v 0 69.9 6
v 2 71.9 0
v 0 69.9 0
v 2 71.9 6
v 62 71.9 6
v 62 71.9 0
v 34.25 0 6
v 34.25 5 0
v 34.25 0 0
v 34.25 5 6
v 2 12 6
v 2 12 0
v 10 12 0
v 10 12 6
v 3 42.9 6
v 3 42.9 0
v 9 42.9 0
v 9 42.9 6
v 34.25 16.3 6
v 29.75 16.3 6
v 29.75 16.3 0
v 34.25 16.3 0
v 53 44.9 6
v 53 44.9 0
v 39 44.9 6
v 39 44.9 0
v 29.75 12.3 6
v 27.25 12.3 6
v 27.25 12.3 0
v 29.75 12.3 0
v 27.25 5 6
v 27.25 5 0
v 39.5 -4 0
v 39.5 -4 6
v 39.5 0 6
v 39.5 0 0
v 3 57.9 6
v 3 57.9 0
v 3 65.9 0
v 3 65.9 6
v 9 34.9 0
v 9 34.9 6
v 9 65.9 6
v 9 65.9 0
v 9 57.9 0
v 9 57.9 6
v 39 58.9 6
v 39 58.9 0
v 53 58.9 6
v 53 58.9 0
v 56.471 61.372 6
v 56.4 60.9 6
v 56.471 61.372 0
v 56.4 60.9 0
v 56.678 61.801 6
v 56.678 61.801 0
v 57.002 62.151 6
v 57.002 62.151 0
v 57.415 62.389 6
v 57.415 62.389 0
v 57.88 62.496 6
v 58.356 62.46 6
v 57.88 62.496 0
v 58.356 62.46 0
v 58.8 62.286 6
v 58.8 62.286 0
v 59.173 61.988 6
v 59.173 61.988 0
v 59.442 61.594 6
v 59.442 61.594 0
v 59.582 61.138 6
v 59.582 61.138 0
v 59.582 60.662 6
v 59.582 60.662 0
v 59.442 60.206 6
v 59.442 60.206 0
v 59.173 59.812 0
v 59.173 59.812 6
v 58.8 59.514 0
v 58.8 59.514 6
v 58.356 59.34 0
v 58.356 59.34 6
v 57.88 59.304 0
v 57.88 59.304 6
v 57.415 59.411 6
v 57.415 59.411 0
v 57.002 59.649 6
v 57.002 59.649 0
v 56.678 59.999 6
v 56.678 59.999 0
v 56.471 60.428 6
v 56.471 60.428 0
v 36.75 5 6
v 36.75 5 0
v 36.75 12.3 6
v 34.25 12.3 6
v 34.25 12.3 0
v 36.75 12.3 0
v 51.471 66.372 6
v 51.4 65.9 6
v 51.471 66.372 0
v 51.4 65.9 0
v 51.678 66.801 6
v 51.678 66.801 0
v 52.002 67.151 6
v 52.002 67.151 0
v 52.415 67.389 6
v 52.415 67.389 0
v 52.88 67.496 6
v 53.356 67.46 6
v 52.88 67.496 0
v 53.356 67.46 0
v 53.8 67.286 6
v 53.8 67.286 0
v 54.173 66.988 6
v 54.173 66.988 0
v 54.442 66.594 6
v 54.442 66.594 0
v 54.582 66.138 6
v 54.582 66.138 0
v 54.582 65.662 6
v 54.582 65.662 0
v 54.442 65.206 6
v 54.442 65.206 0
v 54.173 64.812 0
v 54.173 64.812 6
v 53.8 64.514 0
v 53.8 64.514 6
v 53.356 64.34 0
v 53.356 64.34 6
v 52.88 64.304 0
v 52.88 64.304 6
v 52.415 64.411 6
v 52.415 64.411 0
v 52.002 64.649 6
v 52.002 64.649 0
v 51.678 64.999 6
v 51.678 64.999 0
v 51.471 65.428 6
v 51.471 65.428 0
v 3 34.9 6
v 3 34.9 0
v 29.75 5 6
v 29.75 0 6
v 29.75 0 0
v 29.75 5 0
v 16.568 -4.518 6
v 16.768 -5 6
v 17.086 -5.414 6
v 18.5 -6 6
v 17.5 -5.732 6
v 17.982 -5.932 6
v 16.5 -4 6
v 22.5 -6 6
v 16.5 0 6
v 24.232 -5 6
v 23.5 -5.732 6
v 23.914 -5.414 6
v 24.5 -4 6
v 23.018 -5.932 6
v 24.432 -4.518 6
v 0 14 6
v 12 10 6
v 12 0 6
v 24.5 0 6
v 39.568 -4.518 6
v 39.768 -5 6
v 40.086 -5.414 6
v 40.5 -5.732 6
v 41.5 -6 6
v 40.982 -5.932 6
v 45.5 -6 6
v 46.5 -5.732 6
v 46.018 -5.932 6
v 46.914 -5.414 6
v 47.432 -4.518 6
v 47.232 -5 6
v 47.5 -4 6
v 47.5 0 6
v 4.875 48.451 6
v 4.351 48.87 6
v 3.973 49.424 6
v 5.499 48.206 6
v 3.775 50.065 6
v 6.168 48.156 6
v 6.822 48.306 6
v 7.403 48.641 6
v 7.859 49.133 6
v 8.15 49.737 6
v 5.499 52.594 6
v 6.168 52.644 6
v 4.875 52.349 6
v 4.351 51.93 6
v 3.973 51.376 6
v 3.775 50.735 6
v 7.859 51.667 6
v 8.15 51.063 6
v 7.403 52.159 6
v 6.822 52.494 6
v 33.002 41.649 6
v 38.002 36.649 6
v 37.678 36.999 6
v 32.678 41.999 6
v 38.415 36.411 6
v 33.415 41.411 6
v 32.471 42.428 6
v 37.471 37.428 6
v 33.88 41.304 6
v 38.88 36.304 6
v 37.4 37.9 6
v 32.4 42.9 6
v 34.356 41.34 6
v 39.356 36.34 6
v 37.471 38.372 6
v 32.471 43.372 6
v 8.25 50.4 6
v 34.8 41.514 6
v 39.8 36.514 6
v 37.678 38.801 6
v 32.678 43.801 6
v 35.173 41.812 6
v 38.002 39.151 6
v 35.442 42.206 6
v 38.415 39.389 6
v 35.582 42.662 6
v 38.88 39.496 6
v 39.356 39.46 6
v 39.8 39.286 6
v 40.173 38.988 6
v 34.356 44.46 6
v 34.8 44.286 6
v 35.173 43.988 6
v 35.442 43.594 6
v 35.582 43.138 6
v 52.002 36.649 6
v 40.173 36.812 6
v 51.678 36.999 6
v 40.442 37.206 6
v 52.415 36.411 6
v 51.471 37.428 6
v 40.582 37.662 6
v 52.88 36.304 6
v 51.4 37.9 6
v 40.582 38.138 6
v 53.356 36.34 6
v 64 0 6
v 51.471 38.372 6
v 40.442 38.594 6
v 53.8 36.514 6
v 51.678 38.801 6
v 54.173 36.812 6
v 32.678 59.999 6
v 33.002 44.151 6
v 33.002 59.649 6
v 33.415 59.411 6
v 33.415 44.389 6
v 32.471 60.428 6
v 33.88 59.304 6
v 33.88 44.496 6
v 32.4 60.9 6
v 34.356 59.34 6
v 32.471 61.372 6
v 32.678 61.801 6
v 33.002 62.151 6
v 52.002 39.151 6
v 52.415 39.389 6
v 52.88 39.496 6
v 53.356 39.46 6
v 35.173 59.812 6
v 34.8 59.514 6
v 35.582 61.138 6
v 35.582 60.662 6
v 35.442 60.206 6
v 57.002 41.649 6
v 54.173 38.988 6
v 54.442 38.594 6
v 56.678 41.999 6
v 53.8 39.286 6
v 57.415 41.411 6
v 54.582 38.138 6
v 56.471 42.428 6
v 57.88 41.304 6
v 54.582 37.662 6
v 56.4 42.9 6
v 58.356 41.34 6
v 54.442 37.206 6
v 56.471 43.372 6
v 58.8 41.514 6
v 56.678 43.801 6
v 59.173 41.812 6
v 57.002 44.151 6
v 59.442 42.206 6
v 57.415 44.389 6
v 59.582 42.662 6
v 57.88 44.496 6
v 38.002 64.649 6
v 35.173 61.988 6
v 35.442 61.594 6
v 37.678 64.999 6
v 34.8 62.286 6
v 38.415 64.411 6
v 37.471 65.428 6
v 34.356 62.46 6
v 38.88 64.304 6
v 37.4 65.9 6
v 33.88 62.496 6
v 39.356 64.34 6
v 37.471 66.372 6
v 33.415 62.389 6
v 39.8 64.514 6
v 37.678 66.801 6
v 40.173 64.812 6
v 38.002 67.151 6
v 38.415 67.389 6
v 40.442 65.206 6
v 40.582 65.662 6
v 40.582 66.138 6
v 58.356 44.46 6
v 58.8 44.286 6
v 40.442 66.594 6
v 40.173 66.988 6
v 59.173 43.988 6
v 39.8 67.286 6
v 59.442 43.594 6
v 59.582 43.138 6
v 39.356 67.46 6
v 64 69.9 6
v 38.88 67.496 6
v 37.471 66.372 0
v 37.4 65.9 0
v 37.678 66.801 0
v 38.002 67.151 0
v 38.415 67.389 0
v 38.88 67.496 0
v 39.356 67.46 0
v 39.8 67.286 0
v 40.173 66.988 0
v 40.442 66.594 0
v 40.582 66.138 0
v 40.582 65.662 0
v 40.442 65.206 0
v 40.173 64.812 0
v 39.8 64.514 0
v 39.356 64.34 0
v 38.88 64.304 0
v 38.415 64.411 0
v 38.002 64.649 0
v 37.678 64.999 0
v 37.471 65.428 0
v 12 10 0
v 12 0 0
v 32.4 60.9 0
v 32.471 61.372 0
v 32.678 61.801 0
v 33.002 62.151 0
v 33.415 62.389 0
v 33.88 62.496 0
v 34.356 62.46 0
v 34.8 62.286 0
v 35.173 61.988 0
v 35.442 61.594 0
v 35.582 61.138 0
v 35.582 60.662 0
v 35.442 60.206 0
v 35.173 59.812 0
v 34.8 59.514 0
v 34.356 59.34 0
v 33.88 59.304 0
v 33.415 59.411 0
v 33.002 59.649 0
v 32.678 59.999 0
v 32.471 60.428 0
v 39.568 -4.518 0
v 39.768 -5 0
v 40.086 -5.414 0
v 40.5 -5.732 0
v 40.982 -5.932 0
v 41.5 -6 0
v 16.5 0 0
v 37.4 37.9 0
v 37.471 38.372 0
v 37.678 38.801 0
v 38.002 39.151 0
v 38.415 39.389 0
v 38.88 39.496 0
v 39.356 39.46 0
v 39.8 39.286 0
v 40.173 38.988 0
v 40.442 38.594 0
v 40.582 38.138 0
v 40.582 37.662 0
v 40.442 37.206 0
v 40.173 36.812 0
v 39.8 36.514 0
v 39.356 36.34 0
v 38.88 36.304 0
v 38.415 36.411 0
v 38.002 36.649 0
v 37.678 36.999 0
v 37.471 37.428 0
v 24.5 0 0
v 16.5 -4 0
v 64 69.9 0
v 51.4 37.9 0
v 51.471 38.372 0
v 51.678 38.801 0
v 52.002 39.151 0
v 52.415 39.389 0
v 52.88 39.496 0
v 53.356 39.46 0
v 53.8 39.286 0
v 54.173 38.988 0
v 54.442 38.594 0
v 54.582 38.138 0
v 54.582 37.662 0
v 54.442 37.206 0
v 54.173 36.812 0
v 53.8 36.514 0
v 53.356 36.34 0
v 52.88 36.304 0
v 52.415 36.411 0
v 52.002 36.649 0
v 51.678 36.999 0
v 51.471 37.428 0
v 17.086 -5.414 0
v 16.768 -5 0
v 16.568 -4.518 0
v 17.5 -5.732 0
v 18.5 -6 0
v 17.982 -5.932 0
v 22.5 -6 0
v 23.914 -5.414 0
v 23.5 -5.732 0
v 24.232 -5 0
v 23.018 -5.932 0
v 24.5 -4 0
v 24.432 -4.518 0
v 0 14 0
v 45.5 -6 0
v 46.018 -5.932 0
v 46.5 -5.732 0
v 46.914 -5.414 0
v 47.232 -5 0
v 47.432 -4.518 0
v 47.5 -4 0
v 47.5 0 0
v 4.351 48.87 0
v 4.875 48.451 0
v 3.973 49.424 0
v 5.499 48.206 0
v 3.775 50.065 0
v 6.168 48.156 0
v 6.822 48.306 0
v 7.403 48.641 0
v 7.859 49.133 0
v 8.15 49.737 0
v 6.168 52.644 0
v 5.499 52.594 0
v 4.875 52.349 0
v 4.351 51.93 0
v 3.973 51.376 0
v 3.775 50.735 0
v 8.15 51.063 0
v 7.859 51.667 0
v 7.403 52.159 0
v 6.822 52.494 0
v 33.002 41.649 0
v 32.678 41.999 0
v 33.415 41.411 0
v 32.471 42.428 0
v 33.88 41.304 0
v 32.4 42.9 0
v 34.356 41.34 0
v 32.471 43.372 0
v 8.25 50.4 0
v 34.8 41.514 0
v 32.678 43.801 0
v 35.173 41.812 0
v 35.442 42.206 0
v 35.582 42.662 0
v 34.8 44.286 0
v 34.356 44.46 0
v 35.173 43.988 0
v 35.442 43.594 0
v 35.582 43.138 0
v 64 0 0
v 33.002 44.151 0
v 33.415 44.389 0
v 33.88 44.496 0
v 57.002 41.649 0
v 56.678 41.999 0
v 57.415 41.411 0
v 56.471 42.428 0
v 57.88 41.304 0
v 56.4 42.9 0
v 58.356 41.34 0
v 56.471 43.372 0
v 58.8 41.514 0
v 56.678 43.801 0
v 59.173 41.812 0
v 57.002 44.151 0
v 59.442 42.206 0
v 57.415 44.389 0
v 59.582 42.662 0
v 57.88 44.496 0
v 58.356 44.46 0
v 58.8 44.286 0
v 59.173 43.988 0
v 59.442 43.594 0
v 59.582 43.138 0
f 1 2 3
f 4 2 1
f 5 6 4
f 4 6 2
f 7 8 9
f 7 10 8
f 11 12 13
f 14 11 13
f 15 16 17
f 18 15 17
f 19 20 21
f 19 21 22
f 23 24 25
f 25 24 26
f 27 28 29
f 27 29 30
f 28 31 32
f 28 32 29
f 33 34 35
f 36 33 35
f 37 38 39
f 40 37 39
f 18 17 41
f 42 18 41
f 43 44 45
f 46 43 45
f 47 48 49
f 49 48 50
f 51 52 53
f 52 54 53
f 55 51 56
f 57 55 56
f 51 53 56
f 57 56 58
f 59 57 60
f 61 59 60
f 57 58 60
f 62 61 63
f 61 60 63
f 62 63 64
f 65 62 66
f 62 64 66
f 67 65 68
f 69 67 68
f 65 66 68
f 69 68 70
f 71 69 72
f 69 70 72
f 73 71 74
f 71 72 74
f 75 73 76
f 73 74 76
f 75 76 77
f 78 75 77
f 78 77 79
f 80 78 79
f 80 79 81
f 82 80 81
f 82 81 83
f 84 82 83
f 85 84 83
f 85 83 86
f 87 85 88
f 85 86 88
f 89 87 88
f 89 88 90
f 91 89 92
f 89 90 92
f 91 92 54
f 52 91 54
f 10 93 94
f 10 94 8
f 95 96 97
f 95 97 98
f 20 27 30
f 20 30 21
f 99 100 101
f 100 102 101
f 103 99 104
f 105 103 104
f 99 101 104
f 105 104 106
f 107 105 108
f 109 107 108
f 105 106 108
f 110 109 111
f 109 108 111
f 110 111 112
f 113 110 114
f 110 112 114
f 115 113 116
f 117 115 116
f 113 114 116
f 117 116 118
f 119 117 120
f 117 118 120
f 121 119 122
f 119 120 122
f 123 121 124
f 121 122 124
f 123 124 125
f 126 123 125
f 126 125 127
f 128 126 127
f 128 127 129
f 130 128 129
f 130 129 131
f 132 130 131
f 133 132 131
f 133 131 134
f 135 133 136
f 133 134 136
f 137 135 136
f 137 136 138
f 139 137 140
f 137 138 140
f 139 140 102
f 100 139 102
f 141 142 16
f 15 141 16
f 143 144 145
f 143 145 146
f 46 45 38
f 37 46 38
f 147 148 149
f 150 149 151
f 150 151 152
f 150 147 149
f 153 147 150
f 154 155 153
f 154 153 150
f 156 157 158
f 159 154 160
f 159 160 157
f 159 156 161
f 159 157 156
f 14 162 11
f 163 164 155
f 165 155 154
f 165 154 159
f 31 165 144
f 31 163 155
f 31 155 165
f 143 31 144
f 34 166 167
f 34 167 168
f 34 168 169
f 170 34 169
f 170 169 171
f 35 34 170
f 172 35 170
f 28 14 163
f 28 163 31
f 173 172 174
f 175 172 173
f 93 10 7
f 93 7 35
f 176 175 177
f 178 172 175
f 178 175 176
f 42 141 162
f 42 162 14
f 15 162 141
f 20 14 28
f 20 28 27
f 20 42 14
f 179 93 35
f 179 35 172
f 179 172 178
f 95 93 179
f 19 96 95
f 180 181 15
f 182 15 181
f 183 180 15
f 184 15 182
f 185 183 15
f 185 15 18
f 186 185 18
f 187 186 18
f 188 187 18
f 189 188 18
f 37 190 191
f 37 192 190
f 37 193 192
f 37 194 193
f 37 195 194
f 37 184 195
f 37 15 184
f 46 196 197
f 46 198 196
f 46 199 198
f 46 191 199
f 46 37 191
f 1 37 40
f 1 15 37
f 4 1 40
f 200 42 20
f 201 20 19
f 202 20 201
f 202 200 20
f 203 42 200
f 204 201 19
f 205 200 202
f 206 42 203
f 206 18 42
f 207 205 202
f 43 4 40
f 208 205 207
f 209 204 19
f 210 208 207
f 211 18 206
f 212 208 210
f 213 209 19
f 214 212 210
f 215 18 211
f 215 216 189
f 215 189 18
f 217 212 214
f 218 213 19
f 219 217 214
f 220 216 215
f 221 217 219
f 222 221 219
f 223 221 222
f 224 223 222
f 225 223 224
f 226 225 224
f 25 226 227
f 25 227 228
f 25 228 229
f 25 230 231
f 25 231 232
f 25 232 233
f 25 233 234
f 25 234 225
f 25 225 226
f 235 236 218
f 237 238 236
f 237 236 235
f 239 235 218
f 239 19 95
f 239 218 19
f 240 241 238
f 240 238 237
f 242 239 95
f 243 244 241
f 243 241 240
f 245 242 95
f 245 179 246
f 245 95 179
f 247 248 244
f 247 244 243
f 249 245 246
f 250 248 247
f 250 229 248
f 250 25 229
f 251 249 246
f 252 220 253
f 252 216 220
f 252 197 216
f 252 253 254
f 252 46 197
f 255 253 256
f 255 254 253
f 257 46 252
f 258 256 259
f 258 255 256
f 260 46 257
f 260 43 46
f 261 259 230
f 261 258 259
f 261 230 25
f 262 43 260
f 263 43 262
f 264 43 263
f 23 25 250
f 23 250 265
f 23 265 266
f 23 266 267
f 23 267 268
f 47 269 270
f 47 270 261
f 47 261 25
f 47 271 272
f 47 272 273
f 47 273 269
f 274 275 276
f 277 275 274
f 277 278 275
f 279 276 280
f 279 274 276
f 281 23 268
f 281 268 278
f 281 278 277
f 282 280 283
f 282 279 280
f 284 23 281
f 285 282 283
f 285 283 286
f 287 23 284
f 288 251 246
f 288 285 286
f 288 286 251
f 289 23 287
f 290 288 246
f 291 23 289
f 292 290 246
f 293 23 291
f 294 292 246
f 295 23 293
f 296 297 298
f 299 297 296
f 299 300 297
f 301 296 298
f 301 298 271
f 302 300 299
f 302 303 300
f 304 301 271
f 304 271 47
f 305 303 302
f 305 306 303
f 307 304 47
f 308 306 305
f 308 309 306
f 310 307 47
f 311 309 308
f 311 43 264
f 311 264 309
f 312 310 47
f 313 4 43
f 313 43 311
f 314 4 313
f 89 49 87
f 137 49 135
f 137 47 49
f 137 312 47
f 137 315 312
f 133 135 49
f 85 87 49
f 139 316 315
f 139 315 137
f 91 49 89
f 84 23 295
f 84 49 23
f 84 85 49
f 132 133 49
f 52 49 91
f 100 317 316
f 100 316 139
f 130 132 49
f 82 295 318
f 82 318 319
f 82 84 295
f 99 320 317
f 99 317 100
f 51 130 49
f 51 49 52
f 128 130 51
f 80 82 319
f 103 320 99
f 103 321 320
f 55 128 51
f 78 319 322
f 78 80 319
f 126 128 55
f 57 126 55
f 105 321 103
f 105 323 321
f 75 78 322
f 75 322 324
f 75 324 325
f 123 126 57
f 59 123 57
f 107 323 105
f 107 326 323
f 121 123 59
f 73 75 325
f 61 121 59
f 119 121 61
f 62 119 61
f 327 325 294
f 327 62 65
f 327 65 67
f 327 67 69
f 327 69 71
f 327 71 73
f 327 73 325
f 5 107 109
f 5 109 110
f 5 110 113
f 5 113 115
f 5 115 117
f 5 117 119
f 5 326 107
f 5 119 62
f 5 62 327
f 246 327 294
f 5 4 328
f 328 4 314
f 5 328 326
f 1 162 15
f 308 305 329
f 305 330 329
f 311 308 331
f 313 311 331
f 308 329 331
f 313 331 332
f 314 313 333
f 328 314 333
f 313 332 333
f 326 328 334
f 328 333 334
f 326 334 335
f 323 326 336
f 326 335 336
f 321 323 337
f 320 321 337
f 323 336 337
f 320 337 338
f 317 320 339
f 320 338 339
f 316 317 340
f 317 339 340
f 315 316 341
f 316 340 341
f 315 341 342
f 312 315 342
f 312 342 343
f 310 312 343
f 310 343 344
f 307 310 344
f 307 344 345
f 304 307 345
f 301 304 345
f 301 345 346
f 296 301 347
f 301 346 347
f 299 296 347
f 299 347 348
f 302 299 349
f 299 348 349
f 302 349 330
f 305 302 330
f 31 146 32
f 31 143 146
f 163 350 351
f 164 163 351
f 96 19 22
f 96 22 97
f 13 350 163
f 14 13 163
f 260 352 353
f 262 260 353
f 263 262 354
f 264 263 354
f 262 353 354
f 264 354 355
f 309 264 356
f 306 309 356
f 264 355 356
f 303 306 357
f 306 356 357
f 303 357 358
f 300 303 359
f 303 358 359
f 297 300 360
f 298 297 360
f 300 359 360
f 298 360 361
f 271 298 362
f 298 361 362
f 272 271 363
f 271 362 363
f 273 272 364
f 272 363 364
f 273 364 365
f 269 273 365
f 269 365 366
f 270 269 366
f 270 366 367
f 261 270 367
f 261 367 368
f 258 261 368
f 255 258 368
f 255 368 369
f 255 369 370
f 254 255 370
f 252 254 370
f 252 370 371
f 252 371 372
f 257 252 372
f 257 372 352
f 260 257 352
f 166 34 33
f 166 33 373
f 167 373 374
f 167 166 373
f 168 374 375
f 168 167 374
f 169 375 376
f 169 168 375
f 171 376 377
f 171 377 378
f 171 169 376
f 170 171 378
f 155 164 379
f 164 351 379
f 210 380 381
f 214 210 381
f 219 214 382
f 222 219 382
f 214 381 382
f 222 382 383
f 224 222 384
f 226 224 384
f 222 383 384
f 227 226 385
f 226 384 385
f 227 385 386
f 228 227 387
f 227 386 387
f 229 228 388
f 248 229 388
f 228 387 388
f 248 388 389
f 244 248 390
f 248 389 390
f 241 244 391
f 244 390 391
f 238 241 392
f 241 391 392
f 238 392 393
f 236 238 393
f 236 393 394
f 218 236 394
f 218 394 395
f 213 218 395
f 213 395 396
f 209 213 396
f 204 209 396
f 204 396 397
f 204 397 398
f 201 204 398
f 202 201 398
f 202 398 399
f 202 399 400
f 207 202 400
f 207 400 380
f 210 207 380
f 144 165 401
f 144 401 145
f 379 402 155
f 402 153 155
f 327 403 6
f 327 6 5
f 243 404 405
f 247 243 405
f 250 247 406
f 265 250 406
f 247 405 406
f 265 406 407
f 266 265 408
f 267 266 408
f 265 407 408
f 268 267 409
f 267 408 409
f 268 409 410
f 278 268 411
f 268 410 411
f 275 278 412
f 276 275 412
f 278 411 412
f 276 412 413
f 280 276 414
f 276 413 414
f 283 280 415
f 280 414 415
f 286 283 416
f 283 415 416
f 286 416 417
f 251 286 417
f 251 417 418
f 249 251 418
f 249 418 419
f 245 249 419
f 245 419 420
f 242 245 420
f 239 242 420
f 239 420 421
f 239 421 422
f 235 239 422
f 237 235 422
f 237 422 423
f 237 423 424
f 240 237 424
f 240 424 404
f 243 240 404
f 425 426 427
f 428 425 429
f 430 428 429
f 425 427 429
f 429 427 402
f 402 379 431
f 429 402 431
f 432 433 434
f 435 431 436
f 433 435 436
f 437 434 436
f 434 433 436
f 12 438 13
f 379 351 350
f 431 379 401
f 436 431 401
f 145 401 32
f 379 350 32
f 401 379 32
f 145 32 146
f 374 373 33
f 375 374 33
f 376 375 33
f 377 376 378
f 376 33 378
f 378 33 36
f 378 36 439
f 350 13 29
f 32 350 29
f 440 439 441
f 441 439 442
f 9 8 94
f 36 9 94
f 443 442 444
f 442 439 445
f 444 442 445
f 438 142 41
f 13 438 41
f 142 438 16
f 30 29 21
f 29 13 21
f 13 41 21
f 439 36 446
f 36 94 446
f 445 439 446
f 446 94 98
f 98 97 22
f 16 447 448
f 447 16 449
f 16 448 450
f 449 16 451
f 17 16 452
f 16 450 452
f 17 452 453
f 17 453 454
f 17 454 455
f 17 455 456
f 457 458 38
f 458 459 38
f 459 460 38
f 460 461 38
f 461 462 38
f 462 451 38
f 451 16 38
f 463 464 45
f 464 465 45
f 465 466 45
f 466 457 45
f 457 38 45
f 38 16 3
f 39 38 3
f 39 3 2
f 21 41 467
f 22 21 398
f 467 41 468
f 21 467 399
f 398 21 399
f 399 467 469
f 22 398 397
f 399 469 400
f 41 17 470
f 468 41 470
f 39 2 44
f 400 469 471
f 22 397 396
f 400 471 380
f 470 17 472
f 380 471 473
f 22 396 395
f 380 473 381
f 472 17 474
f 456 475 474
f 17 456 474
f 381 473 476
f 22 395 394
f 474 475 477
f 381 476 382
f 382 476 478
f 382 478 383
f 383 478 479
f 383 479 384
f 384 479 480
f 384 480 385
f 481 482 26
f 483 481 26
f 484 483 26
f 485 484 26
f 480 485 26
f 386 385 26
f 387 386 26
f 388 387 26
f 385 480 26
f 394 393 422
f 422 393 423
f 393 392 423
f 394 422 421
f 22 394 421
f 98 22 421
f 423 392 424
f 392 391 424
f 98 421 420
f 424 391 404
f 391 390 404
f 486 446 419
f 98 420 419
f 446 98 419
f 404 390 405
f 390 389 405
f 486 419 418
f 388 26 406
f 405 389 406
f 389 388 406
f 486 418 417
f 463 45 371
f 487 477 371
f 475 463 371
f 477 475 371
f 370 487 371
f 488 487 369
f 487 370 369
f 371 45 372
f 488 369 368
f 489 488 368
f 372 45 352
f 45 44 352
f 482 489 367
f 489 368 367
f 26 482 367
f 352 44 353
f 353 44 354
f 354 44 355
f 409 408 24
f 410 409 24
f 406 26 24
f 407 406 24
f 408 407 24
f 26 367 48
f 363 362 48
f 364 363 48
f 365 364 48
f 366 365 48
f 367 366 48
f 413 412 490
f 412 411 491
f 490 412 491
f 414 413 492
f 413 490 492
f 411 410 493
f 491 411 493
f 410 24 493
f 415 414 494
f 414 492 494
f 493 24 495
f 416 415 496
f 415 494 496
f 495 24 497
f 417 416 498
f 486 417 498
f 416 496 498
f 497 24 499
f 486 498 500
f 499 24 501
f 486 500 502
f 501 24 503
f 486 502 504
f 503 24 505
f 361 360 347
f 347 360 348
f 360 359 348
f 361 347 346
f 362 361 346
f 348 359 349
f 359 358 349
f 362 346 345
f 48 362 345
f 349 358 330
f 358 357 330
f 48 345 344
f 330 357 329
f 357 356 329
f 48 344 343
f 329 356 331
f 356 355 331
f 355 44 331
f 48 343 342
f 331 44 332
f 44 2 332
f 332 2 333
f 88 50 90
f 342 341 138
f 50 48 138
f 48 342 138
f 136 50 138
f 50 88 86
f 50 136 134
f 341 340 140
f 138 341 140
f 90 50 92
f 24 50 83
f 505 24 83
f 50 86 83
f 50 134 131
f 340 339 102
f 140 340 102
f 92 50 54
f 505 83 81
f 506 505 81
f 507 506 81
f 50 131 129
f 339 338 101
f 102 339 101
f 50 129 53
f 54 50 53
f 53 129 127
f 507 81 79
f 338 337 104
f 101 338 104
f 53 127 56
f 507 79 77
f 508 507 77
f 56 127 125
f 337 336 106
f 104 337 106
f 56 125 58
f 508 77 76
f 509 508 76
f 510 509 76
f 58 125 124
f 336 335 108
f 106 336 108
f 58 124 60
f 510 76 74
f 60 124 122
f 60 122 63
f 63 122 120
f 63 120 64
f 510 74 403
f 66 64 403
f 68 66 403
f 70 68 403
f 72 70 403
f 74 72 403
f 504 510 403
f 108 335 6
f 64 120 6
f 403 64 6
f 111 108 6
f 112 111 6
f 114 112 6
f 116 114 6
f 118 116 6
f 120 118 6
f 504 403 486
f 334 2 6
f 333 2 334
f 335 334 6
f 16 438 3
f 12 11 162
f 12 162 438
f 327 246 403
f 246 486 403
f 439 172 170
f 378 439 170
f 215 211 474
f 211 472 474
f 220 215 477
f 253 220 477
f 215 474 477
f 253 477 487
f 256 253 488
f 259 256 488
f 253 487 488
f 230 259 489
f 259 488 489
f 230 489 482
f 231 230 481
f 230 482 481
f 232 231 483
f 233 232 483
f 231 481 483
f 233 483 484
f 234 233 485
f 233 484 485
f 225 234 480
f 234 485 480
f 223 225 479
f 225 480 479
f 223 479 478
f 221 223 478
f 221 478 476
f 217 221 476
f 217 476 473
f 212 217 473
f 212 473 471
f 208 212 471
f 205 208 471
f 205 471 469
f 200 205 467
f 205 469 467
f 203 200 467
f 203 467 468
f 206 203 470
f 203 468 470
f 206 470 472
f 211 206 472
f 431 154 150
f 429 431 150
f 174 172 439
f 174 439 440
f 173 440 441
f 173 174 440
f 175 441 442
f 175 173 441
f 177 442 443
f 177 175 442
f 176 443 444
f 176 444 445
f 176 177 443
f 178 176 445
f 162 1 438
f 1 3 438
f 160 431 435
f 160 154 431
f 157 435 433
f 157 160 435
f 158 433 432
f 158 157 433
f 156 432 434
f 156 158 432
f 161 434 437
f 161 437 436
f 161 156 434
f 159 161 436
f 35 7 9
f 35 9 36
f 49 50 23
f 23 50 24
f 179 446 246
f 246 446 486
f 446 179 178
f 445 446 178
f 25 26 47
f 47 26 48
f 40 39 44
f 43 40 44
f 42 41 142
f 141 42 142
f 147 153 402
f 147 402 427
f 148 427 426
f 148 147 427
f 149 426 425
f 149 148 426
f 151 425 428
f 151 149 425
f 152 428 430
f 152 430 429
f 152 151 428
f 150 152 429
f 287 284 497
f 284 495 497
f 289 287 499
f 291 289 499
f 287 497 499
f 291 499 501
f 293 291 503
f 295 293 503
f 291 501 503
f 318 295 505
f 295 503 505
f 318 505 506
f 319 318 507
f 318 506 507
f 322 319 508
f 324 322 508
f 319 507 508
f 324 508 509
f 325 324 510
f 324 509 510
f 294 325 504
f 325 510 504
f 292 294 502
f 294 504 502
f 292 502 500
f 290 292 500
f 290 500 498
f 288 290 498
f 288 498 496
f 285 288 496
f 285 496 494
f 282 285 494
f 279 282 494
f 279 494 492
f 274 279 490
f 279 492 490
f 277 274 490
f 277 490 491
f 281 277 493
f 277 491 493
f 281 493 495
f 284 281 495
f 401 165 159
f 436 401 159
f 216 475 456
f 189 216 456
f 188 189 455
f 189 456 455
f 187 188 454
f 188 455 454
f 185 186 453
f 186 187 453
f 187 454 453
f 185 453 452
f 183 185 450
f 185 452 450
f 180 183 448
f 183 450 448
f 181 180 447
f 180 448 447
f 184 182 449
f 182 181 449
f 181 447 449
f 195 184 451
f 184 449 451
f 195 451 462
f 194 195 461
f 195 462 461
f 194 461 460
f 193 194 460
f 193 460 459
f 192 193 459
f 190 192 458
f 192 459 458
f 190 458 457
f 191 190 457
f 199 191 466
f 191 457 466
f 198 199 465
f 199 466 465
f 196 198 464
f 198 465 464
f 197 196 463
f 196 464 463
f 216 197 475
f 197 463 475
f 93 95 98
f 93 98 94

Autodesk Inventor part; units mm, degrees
ref_plane "YZ Plane" through (0, 0, 0) normal (1, 0, 0) x (0, 1, 0)
ref_plane "XZ Plane" through (0, 0, 0) normal (0, 1, 0) x (-1, 0, 0)
ref_plane "XY Plane" through (0, 0, 0) normal (0, 0, 1) x (1, 0, 0)
sketch "Sketch1" plane through (0, 0, 0) normal (0, 0, 1) x (1, 0, 0)
  line L0 (12, 0) -> (64, 0)
  line L1 (64, 0) -> (64, 71.9)
  line L2 (64, 71.9) -> (0, 71.9)
  line L3 (0, 71.9) -> (0, 12)
  line L4 (3, 65.9) -> (9, 65.9)
  line L5 (9, 65.9) -> (9, 57.9)
  line L6 (9, 57.9) -> (3, 57.9)
  line L7 (3, 57.9) -> (3, 65.9)
  line L8 (3, 42.9) -> (9, 42.9)
  line L9 (9, 42.9) -> (9, 34.9)
  line L10 (9, 34.9) -> (3, 34.9)
  line L11 (3, 34.9) -> (3, 42.9)
  line L12 (0, 12) -> (12, 12)
  line L13 (12, 12) -> (12, 0)
  line L14 (3, 57.9) -> (9, 42.9) construction
  line L15 (3, 42.9) -> (9, 57.9) construction
  circle A0 centre (6, 50.4) radius 2.25
  point P0 (0, 0)
  dimension "d1" = 6
  dimension "d2" = 8
  dimension "d3" = 8
  dimension "d4" = 15
  dimension "d5" = 3
  dimension "d6" = 71.9
  dimension "d7" = 4.5
  dimension "d8" = 64
  dimension "d9" = 12
  dimension "d10" = 52
  dimension "d11" = 6
extrude "Extrusion1" add sketch "Sketch1" along normal blind 6
sketch "Sketch2" plane through (0, 0, 6) normal (0, 0, 1) x (1, 0, 0)
  line L0 (64, 0) -> (64, 71.9) projected
  line L1 (12, 0) -> (64, 0) projected
  line L2 (29.75, 16.3) -> (34.25, 16.3)
  line L3 (34.25, 0) -> (29.75, 0)
  line L4 (36.75, 12.3) -> (36.75, 5)
  line L5 (27.25, 5) -> (27.25, 12.3)
  line L6 (29.75, 0) -> (29.75, 5)
  line L7 (29.75, 12.3) -> (29.75, 16.3)
  line L8 (27.25, 12.3) -> (29.75, 12.3)
  line L9 (34.25, 12.3) -> (36.75, 12.3)
  line L10 (34.25, 16.3) -> (34.25, 12.3)
  line L11 (34.25, 5) -> (34.25, 0)
  line L12 (36.75, 5) -> (34.25, 5)
  line L13 (29.75, 5) -> (27.25, 5)
  point P0 (0, 0)
  point P1 (32, 16.3)
  dimension "d14" = 2.5
  dimension "d15" = 2.5
  dimension "d16" = 4.5
  dimension "d17" = 5
  dimension "d18" = 7.3
  dimension "d19" = 4
  dimension "d20" = 32
extrude "Extrusion2" cut sketch "Sketch2" against normal blind 6
sketch "Sketch3" plane through (0, 0, 6) normal (0, 0, 1) x (1, 0, 0)
  line L0 (34.25, 0) -> (64, 0) projected
  line L1 (12, 0) -> (29.75, 0) projected
  line L2 (29.75, 16.3) -> (34.25, 16.3) projected
  line L3 (16.5, 0) -> (24.5, 0)
  line L4 (24.5, 0) -> (24.5, -4)
  line L5 (22.5, -6) -> (18.5, -6)
  line L6 (16.5, -4) -> (16.5, 0)
  line L7 (39.5, 0) -> (47.5, 0)
  line L8 (47.5, 0) -> (47.5, -4)
  line L9 (45.5, -6) -> (41.5, -6)
  line L10 (39.5, -4) -> (39.5, 0)
  arc A0 (16.5, -4) -> (18.5, -6) centre (18.5, -4) ccw
  arc A1 (22.5, -6) -> (24.5, -4) centre (22.5, -4) ccw
  arc A2 (39.5, -4) -> (41.5, -6) centre (41.5, -4) ccw
  arc A3 (45.5, -6) -> (47.5, -4) centre (45.5, -4) ccw
  point P0 (0, 0)
  point P1 (32, 16.3)
  dimension "d23" = 2
  dimension "d24" = 8
  dimension "d25" = 8
  dimension "d26" = 6
  dimension "d27" = 15
  dimension "d28" = 7.5
extrude "Extrusion3" add sketch "Sketch3" against normal blind 6
chamfer "Chamfer1" distance 2 angle 45 2 edges at (0, 71.9, 3) (64, 71.9, 3)
sketch "Sketch4" plane through (0, 0, 0) normal (0, 0, -1) x (-1, 0, 0)
  line L0 (-64, 69.9) -> (-64, 0) projected
  line L1 (-2, 71.9) -> (-62, 71.9) projected
  line L2 (-39, 58.9) -> (-53, 58.9)
  line L3 (-53, 58.9) -> (-53, 44.9)
  line L4 (-53, 44.9) -> (-39, 44.9)
  line L5 (-39, 44.9) -> (-39, 58.9)
  line L6 (-34, 65.9) -> (-58, 65.9) construction
  line L7 (-58, 65.9) -> (-58, 37.9) construction
  line L8 (-58, 37.9) -> (-34, 37.9) construction
  line L9 (-34, 37.9) -> (-34, 65.9) construction
  circle A0 centre (-58, 60.9) radius 1.6
  circle A1 centre (-58, 42.9) radius 1.6
  circle A2 centre (-53, 37.9) radius 1.6
  circle A3 centre (-39, 37.9) radius 1.6
  circle A4 centre (-34, 42.9) radius 1.6
  circle A5 centre (-34, 60.9) radius 1.6
  circle A6 centre (-39, 65.9) radius 1.6
  circle A7 centre (-53, 65.9) radius 1.6
  point P0 (0, 0)
  point P1 (-58, 51.9)
  point P2 (-53, 51.9)
  point P3 (-46, 37.9)
  point P4 (-46, 44.9)
  dimension "d34" = 3.2
  dimension "d35" = 5
  dimension "d36" = 5
  dimension "d37" = 5
  dimension "d38" = 5
  dimension "d39" = 5
  dimension "d40" = 5
  dimension "d41" = 5
  dimension "d42" = 5
  dimension "d43" = 14
  dimension "d44" = 14
  dimension "d45" = 5
  dimension "d46" = 7
  dimension "d47" = 6
  dimension "d48" = 6
extrude "Extrusion4" cut sketch "Sketch4" against normal through all
chamfer "Chamfer2" distance 2 angle 45 2 edges at (0, 12, 3) (12, 12, 3)
equation "\"d36\" = d35"
equation "\"d37\" = d35"
equation "\"d38\" = d35"
equation "\"d39\" = d35"
equation "\"d40\" = d35"
equation "\"d41\" = d35"
equation "\"d42\" = d35"
properties part number "x_motor_cable_mount"
